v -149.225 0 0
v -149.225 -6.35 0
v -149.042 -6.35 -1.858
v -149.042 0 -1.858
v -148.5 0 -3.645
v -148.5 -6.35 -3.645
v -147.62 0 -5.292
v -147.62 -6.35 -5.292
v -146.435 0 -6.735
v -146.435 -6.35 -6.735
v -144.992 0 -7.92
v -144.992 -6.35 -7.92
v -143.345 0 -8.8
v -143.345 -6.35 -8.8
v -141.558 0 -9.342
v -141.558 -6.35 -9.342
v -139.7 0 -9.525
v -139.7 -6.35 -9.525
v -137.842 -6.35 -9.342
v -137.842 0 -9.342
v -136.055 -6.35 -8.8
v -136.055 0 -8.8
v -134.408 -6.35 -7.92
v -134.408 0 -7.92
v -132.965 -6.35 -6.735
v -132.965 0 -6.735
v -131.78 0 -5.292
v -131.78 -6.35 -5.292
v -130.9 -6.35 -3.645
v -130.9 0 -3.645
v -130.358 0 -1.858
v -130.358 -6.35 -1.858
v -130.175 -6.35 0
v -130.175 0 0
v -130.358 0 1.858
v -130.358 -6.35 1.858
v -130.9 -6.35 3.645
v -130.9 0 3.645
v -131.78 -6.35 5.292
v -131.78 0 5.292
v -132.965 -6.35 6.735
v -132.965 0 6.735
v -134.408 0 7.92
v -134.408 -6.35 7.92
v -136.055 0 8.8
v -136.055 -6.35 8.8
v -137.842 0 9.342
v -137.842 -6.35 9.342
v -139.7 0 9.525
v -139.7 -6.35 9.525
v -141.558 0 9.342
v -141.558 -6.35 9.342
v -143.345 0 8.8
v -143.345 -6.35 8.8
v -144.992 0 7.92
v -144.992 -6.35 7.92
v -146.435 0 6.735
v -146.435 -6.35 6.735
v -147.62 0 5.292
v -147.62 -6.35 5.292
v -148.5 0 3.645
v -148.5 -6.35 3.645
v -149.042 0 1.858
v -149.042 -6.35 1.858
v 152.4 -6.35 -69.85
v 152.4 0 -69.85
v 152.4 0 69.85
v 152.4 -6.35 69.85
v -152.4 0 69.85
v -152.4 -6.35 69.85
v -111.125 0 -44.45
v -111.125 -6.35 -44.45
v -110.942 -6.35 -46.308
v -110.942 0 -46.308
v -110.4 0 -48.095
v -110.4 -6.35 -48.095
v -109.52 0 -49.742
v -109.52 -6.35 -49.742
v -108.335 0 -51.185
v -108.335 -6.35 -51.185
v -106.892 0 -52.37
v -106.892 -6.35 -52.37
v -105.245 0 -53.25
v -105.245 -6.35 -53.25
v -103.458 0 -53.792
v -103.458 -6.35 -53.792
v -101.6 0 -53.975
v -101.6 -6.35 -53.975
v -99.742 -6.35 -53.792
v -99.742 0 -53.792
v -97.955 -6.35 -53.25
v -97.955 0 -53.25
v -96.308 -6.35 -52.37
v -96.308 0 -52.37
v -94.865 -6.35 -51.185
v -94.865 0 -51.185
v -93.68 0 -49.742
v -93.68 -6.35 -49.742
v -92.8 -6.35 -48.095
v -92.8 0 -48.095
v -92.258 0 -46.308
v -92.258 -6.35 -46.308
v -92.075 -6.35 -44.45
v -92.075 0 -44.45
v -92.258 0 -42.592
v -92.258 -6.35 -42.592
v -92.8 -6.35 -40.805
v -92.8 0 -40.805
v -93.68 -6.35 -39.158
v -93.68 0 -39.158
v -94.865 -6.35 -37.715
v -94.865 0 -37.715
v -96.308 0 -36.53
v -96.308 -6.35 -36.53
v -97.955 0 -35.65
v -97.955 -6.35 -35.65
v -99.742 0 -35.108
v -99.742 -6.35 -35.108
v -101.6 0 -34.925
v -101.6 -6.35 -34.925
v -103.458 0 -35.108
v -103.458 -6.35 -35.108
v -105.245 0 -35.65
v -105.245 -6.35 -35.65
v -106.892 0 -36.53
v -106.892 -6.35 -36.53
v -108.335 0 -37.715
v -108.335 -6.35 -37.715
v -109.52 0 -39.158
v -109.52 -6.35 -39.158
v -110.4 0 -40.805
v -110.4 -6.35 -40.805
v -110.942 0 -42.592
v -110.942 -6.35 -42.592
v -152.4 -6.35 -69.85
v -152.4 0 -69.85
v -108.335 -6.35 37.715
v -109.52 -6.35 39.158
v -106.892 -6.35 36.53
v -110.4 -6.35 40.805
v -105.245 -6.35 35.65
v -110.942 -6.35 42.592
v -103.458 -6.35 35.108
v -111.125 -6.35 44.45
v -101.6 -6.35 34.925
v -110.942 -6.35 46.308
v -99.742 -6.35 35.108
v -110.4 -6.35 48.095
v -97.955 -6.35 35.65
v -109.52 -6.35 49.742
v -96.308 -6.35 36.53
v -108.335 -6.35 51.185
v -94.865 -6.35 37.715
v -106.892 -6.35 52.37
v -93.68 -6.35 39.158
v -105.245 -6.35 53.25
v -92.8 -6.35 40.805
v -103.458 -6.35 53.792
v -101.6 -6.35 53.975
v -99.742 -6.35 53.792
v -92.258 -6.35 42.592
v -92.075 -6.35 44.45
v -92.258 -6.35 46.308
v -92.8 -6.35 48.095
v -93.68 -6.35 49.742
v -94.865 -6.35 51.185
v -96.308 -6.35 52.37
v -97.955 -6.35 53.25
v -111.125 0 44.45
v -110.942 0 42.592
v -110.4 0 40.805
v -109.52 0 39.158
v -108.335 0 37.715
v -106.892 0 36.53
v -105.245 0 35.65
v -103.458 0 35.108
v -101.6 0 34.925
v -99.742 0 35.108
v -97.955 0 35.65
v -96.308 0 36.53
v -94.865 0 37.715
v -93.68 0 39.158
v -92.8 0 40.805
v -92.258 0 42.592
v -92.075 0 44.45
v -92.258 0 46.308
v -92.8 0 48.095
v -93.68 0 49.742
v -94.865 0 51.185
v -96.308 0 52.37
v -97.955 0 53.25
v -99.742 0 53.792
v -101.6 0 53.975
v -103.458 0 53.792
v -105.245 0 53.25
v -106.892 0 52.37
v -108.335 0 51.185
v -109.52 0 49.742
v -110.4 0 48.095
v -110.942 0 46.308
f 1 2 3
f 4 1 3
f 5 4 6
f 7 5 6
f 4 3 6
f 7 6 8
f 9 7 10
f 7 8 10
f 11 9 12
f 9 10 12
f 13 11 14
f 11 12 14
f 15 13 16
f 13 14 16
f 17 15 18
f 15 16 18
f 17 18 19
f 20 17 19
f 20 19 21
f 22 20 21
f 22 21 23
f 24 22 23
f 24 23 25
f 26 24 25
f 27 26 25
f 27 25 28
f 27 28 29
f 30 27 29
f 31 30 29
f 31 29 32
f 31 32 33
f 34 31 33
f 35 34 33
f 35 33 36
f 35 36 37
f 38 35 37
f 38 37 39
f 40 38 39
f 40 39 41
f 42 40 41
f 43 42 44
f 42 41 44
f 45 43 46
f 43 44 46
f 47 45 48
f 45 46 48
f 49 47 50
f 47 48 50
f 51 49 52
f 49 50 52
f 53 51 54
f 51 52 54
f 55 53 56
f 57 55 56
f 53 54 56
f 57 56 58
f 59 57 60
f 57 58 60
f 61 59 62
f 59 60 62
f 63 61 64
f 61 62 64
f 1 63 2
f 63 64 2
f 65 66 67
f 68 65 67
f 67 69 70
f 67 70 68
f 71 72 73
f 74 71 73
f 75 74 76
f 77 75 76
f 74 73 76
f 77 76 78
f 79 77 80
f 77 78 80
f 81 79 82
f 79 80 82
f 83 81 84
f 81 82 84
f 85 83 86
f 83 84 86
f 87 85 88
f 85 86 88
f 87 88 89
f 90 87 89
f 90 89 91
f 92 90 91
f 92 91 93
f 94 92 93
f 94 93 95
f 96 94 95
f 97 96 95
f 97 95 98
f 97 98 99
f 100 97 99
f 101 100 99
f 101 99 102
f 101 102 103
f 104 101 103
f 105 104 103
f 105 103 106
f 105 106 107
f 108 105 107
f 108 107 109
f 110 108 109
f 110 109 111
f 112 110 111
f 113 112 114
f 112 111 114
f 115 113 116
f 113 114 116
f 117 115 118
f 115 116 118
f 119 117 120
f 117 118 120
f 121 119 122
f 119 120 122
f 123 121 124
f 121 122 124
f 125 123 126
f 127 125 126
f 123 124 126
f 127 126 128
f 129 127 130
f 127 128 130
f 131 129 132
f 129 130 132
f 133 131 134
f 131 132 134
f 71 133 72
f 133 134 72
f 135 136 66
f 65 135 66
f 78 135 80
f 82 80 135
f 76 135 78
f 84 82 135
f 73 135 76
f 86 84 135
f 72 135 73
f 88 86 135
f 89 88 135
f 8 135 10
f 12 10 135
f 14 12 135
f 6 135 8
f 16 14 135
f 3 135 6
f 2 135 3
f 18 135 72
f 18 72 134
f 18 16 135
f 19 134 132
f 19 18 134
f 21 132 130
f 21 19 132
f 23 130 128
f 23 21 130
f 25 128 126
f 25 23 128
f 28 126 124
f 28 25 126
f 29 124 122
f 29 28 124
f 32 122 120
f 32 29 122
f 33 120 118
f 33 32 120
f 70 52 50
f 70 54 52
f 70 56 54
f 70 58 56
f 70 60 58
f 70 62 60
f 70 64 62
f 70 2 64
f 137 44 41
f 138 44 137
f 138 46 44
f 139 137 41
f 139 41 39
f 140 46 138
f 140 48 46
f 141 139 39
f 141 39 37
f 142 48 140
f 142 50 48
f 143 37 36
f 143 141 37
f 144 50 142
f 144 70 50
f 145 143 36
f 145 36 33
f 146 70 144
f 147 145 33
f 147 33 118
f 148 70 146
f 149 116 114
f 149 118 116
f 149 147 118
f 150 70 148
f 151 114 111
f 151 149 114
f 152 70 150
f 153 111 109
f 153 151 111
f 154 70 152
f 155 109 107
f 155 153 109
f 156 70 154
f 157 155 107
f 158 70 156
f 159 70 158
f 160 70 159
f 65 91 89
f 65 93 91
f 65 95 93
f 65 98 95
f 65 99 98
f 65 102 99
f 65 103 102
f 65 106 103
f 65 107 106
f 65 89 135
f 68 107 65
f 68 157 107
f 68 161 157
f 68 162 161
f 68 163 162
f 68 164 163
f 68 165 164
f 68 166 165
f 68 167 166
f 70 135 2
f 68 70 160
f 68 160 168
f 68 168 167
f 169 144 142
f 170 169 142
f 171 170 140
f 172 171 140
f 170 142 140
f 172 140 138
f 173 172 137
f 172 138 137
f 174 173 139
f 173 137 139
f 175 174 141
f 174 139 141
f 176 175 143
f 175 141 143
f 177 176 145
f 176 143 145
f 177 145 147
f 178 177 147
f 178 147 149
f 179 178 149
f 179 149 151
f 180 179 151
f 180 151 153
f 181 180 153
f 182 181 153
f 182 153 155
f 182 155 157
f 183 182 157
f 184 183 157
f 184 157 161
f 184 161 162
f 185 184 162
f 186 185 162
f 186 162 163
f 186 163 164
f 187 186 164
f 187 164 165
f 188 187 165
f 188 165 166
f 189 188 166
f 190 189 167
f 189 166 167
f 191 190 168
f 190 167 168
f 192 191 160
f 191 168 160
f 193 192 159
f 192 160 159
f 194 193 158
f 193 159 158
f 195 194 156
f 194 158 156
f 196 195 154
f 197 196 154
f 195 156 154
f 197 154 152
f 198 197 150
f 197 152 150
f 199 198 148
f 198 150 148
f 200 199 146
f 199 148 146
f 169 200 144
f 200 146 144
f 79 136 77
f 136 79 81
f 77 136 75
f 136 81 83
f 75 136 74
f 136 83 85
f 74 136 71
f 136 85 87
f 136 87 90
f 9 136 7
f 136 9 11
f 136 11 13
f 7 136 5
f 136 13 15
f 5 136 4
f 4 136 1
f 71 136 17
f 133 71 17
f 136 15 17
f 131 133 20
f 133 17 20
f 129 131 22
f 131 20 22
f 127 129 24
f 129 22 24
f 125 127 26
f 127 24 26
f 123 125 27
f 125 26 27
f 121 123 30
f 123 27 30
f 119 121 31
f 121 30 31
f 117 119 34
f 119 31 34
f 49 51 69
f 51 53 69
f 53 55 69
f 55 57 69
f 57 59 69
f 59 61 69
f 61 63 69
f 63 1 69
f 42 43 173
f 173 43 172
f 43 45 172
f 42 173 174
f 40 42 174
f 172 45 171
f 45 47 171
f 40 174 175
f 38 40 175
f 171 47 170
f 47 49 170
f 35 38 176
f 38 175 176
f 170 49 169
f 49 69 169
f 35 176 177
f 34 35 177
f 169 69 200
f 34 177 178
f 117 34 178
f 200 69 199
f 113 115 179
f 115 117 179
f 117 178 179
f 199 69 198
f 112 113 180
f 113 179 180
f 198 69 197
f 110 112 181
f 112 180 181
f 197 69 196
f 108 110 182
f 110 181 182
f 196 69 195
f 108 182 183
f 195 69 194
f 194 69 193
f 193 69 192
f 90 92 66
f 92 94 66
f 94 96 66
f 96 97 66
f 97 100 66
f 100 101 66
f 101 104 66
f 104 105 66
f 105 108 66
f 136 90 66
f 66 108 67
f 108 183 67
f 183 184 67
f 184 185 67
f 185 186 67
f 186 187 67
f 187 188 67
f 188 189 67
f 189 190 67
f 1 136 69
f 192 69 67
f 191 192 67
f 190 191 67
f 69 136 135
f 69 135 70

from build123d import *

# Parameters (mm, degrees)
F0_W     = 304.8
F0_H     = 139.7
F1_DEPTH = 6.35
F3_D     = 19.05


with BuildPart() as f1:
    # F0 (on Front) → F1 (new body)
    with BuildSketch(Plane.XZ):
        Rectangle(F0_W, F0_H)
    extrude(amount=F1_DEPTH)

    # F3 (through all)
    with Locations(Plane(origin=(0, 0, 0), x_dir=(1, 0, 0), z_dir=(0, 1, 0))):
        with Locations((-101.6, 44.45), (-139.7, 0), (-101.6, -44.45)):
            Hole(F3_D / 2)


solid = f1.part
